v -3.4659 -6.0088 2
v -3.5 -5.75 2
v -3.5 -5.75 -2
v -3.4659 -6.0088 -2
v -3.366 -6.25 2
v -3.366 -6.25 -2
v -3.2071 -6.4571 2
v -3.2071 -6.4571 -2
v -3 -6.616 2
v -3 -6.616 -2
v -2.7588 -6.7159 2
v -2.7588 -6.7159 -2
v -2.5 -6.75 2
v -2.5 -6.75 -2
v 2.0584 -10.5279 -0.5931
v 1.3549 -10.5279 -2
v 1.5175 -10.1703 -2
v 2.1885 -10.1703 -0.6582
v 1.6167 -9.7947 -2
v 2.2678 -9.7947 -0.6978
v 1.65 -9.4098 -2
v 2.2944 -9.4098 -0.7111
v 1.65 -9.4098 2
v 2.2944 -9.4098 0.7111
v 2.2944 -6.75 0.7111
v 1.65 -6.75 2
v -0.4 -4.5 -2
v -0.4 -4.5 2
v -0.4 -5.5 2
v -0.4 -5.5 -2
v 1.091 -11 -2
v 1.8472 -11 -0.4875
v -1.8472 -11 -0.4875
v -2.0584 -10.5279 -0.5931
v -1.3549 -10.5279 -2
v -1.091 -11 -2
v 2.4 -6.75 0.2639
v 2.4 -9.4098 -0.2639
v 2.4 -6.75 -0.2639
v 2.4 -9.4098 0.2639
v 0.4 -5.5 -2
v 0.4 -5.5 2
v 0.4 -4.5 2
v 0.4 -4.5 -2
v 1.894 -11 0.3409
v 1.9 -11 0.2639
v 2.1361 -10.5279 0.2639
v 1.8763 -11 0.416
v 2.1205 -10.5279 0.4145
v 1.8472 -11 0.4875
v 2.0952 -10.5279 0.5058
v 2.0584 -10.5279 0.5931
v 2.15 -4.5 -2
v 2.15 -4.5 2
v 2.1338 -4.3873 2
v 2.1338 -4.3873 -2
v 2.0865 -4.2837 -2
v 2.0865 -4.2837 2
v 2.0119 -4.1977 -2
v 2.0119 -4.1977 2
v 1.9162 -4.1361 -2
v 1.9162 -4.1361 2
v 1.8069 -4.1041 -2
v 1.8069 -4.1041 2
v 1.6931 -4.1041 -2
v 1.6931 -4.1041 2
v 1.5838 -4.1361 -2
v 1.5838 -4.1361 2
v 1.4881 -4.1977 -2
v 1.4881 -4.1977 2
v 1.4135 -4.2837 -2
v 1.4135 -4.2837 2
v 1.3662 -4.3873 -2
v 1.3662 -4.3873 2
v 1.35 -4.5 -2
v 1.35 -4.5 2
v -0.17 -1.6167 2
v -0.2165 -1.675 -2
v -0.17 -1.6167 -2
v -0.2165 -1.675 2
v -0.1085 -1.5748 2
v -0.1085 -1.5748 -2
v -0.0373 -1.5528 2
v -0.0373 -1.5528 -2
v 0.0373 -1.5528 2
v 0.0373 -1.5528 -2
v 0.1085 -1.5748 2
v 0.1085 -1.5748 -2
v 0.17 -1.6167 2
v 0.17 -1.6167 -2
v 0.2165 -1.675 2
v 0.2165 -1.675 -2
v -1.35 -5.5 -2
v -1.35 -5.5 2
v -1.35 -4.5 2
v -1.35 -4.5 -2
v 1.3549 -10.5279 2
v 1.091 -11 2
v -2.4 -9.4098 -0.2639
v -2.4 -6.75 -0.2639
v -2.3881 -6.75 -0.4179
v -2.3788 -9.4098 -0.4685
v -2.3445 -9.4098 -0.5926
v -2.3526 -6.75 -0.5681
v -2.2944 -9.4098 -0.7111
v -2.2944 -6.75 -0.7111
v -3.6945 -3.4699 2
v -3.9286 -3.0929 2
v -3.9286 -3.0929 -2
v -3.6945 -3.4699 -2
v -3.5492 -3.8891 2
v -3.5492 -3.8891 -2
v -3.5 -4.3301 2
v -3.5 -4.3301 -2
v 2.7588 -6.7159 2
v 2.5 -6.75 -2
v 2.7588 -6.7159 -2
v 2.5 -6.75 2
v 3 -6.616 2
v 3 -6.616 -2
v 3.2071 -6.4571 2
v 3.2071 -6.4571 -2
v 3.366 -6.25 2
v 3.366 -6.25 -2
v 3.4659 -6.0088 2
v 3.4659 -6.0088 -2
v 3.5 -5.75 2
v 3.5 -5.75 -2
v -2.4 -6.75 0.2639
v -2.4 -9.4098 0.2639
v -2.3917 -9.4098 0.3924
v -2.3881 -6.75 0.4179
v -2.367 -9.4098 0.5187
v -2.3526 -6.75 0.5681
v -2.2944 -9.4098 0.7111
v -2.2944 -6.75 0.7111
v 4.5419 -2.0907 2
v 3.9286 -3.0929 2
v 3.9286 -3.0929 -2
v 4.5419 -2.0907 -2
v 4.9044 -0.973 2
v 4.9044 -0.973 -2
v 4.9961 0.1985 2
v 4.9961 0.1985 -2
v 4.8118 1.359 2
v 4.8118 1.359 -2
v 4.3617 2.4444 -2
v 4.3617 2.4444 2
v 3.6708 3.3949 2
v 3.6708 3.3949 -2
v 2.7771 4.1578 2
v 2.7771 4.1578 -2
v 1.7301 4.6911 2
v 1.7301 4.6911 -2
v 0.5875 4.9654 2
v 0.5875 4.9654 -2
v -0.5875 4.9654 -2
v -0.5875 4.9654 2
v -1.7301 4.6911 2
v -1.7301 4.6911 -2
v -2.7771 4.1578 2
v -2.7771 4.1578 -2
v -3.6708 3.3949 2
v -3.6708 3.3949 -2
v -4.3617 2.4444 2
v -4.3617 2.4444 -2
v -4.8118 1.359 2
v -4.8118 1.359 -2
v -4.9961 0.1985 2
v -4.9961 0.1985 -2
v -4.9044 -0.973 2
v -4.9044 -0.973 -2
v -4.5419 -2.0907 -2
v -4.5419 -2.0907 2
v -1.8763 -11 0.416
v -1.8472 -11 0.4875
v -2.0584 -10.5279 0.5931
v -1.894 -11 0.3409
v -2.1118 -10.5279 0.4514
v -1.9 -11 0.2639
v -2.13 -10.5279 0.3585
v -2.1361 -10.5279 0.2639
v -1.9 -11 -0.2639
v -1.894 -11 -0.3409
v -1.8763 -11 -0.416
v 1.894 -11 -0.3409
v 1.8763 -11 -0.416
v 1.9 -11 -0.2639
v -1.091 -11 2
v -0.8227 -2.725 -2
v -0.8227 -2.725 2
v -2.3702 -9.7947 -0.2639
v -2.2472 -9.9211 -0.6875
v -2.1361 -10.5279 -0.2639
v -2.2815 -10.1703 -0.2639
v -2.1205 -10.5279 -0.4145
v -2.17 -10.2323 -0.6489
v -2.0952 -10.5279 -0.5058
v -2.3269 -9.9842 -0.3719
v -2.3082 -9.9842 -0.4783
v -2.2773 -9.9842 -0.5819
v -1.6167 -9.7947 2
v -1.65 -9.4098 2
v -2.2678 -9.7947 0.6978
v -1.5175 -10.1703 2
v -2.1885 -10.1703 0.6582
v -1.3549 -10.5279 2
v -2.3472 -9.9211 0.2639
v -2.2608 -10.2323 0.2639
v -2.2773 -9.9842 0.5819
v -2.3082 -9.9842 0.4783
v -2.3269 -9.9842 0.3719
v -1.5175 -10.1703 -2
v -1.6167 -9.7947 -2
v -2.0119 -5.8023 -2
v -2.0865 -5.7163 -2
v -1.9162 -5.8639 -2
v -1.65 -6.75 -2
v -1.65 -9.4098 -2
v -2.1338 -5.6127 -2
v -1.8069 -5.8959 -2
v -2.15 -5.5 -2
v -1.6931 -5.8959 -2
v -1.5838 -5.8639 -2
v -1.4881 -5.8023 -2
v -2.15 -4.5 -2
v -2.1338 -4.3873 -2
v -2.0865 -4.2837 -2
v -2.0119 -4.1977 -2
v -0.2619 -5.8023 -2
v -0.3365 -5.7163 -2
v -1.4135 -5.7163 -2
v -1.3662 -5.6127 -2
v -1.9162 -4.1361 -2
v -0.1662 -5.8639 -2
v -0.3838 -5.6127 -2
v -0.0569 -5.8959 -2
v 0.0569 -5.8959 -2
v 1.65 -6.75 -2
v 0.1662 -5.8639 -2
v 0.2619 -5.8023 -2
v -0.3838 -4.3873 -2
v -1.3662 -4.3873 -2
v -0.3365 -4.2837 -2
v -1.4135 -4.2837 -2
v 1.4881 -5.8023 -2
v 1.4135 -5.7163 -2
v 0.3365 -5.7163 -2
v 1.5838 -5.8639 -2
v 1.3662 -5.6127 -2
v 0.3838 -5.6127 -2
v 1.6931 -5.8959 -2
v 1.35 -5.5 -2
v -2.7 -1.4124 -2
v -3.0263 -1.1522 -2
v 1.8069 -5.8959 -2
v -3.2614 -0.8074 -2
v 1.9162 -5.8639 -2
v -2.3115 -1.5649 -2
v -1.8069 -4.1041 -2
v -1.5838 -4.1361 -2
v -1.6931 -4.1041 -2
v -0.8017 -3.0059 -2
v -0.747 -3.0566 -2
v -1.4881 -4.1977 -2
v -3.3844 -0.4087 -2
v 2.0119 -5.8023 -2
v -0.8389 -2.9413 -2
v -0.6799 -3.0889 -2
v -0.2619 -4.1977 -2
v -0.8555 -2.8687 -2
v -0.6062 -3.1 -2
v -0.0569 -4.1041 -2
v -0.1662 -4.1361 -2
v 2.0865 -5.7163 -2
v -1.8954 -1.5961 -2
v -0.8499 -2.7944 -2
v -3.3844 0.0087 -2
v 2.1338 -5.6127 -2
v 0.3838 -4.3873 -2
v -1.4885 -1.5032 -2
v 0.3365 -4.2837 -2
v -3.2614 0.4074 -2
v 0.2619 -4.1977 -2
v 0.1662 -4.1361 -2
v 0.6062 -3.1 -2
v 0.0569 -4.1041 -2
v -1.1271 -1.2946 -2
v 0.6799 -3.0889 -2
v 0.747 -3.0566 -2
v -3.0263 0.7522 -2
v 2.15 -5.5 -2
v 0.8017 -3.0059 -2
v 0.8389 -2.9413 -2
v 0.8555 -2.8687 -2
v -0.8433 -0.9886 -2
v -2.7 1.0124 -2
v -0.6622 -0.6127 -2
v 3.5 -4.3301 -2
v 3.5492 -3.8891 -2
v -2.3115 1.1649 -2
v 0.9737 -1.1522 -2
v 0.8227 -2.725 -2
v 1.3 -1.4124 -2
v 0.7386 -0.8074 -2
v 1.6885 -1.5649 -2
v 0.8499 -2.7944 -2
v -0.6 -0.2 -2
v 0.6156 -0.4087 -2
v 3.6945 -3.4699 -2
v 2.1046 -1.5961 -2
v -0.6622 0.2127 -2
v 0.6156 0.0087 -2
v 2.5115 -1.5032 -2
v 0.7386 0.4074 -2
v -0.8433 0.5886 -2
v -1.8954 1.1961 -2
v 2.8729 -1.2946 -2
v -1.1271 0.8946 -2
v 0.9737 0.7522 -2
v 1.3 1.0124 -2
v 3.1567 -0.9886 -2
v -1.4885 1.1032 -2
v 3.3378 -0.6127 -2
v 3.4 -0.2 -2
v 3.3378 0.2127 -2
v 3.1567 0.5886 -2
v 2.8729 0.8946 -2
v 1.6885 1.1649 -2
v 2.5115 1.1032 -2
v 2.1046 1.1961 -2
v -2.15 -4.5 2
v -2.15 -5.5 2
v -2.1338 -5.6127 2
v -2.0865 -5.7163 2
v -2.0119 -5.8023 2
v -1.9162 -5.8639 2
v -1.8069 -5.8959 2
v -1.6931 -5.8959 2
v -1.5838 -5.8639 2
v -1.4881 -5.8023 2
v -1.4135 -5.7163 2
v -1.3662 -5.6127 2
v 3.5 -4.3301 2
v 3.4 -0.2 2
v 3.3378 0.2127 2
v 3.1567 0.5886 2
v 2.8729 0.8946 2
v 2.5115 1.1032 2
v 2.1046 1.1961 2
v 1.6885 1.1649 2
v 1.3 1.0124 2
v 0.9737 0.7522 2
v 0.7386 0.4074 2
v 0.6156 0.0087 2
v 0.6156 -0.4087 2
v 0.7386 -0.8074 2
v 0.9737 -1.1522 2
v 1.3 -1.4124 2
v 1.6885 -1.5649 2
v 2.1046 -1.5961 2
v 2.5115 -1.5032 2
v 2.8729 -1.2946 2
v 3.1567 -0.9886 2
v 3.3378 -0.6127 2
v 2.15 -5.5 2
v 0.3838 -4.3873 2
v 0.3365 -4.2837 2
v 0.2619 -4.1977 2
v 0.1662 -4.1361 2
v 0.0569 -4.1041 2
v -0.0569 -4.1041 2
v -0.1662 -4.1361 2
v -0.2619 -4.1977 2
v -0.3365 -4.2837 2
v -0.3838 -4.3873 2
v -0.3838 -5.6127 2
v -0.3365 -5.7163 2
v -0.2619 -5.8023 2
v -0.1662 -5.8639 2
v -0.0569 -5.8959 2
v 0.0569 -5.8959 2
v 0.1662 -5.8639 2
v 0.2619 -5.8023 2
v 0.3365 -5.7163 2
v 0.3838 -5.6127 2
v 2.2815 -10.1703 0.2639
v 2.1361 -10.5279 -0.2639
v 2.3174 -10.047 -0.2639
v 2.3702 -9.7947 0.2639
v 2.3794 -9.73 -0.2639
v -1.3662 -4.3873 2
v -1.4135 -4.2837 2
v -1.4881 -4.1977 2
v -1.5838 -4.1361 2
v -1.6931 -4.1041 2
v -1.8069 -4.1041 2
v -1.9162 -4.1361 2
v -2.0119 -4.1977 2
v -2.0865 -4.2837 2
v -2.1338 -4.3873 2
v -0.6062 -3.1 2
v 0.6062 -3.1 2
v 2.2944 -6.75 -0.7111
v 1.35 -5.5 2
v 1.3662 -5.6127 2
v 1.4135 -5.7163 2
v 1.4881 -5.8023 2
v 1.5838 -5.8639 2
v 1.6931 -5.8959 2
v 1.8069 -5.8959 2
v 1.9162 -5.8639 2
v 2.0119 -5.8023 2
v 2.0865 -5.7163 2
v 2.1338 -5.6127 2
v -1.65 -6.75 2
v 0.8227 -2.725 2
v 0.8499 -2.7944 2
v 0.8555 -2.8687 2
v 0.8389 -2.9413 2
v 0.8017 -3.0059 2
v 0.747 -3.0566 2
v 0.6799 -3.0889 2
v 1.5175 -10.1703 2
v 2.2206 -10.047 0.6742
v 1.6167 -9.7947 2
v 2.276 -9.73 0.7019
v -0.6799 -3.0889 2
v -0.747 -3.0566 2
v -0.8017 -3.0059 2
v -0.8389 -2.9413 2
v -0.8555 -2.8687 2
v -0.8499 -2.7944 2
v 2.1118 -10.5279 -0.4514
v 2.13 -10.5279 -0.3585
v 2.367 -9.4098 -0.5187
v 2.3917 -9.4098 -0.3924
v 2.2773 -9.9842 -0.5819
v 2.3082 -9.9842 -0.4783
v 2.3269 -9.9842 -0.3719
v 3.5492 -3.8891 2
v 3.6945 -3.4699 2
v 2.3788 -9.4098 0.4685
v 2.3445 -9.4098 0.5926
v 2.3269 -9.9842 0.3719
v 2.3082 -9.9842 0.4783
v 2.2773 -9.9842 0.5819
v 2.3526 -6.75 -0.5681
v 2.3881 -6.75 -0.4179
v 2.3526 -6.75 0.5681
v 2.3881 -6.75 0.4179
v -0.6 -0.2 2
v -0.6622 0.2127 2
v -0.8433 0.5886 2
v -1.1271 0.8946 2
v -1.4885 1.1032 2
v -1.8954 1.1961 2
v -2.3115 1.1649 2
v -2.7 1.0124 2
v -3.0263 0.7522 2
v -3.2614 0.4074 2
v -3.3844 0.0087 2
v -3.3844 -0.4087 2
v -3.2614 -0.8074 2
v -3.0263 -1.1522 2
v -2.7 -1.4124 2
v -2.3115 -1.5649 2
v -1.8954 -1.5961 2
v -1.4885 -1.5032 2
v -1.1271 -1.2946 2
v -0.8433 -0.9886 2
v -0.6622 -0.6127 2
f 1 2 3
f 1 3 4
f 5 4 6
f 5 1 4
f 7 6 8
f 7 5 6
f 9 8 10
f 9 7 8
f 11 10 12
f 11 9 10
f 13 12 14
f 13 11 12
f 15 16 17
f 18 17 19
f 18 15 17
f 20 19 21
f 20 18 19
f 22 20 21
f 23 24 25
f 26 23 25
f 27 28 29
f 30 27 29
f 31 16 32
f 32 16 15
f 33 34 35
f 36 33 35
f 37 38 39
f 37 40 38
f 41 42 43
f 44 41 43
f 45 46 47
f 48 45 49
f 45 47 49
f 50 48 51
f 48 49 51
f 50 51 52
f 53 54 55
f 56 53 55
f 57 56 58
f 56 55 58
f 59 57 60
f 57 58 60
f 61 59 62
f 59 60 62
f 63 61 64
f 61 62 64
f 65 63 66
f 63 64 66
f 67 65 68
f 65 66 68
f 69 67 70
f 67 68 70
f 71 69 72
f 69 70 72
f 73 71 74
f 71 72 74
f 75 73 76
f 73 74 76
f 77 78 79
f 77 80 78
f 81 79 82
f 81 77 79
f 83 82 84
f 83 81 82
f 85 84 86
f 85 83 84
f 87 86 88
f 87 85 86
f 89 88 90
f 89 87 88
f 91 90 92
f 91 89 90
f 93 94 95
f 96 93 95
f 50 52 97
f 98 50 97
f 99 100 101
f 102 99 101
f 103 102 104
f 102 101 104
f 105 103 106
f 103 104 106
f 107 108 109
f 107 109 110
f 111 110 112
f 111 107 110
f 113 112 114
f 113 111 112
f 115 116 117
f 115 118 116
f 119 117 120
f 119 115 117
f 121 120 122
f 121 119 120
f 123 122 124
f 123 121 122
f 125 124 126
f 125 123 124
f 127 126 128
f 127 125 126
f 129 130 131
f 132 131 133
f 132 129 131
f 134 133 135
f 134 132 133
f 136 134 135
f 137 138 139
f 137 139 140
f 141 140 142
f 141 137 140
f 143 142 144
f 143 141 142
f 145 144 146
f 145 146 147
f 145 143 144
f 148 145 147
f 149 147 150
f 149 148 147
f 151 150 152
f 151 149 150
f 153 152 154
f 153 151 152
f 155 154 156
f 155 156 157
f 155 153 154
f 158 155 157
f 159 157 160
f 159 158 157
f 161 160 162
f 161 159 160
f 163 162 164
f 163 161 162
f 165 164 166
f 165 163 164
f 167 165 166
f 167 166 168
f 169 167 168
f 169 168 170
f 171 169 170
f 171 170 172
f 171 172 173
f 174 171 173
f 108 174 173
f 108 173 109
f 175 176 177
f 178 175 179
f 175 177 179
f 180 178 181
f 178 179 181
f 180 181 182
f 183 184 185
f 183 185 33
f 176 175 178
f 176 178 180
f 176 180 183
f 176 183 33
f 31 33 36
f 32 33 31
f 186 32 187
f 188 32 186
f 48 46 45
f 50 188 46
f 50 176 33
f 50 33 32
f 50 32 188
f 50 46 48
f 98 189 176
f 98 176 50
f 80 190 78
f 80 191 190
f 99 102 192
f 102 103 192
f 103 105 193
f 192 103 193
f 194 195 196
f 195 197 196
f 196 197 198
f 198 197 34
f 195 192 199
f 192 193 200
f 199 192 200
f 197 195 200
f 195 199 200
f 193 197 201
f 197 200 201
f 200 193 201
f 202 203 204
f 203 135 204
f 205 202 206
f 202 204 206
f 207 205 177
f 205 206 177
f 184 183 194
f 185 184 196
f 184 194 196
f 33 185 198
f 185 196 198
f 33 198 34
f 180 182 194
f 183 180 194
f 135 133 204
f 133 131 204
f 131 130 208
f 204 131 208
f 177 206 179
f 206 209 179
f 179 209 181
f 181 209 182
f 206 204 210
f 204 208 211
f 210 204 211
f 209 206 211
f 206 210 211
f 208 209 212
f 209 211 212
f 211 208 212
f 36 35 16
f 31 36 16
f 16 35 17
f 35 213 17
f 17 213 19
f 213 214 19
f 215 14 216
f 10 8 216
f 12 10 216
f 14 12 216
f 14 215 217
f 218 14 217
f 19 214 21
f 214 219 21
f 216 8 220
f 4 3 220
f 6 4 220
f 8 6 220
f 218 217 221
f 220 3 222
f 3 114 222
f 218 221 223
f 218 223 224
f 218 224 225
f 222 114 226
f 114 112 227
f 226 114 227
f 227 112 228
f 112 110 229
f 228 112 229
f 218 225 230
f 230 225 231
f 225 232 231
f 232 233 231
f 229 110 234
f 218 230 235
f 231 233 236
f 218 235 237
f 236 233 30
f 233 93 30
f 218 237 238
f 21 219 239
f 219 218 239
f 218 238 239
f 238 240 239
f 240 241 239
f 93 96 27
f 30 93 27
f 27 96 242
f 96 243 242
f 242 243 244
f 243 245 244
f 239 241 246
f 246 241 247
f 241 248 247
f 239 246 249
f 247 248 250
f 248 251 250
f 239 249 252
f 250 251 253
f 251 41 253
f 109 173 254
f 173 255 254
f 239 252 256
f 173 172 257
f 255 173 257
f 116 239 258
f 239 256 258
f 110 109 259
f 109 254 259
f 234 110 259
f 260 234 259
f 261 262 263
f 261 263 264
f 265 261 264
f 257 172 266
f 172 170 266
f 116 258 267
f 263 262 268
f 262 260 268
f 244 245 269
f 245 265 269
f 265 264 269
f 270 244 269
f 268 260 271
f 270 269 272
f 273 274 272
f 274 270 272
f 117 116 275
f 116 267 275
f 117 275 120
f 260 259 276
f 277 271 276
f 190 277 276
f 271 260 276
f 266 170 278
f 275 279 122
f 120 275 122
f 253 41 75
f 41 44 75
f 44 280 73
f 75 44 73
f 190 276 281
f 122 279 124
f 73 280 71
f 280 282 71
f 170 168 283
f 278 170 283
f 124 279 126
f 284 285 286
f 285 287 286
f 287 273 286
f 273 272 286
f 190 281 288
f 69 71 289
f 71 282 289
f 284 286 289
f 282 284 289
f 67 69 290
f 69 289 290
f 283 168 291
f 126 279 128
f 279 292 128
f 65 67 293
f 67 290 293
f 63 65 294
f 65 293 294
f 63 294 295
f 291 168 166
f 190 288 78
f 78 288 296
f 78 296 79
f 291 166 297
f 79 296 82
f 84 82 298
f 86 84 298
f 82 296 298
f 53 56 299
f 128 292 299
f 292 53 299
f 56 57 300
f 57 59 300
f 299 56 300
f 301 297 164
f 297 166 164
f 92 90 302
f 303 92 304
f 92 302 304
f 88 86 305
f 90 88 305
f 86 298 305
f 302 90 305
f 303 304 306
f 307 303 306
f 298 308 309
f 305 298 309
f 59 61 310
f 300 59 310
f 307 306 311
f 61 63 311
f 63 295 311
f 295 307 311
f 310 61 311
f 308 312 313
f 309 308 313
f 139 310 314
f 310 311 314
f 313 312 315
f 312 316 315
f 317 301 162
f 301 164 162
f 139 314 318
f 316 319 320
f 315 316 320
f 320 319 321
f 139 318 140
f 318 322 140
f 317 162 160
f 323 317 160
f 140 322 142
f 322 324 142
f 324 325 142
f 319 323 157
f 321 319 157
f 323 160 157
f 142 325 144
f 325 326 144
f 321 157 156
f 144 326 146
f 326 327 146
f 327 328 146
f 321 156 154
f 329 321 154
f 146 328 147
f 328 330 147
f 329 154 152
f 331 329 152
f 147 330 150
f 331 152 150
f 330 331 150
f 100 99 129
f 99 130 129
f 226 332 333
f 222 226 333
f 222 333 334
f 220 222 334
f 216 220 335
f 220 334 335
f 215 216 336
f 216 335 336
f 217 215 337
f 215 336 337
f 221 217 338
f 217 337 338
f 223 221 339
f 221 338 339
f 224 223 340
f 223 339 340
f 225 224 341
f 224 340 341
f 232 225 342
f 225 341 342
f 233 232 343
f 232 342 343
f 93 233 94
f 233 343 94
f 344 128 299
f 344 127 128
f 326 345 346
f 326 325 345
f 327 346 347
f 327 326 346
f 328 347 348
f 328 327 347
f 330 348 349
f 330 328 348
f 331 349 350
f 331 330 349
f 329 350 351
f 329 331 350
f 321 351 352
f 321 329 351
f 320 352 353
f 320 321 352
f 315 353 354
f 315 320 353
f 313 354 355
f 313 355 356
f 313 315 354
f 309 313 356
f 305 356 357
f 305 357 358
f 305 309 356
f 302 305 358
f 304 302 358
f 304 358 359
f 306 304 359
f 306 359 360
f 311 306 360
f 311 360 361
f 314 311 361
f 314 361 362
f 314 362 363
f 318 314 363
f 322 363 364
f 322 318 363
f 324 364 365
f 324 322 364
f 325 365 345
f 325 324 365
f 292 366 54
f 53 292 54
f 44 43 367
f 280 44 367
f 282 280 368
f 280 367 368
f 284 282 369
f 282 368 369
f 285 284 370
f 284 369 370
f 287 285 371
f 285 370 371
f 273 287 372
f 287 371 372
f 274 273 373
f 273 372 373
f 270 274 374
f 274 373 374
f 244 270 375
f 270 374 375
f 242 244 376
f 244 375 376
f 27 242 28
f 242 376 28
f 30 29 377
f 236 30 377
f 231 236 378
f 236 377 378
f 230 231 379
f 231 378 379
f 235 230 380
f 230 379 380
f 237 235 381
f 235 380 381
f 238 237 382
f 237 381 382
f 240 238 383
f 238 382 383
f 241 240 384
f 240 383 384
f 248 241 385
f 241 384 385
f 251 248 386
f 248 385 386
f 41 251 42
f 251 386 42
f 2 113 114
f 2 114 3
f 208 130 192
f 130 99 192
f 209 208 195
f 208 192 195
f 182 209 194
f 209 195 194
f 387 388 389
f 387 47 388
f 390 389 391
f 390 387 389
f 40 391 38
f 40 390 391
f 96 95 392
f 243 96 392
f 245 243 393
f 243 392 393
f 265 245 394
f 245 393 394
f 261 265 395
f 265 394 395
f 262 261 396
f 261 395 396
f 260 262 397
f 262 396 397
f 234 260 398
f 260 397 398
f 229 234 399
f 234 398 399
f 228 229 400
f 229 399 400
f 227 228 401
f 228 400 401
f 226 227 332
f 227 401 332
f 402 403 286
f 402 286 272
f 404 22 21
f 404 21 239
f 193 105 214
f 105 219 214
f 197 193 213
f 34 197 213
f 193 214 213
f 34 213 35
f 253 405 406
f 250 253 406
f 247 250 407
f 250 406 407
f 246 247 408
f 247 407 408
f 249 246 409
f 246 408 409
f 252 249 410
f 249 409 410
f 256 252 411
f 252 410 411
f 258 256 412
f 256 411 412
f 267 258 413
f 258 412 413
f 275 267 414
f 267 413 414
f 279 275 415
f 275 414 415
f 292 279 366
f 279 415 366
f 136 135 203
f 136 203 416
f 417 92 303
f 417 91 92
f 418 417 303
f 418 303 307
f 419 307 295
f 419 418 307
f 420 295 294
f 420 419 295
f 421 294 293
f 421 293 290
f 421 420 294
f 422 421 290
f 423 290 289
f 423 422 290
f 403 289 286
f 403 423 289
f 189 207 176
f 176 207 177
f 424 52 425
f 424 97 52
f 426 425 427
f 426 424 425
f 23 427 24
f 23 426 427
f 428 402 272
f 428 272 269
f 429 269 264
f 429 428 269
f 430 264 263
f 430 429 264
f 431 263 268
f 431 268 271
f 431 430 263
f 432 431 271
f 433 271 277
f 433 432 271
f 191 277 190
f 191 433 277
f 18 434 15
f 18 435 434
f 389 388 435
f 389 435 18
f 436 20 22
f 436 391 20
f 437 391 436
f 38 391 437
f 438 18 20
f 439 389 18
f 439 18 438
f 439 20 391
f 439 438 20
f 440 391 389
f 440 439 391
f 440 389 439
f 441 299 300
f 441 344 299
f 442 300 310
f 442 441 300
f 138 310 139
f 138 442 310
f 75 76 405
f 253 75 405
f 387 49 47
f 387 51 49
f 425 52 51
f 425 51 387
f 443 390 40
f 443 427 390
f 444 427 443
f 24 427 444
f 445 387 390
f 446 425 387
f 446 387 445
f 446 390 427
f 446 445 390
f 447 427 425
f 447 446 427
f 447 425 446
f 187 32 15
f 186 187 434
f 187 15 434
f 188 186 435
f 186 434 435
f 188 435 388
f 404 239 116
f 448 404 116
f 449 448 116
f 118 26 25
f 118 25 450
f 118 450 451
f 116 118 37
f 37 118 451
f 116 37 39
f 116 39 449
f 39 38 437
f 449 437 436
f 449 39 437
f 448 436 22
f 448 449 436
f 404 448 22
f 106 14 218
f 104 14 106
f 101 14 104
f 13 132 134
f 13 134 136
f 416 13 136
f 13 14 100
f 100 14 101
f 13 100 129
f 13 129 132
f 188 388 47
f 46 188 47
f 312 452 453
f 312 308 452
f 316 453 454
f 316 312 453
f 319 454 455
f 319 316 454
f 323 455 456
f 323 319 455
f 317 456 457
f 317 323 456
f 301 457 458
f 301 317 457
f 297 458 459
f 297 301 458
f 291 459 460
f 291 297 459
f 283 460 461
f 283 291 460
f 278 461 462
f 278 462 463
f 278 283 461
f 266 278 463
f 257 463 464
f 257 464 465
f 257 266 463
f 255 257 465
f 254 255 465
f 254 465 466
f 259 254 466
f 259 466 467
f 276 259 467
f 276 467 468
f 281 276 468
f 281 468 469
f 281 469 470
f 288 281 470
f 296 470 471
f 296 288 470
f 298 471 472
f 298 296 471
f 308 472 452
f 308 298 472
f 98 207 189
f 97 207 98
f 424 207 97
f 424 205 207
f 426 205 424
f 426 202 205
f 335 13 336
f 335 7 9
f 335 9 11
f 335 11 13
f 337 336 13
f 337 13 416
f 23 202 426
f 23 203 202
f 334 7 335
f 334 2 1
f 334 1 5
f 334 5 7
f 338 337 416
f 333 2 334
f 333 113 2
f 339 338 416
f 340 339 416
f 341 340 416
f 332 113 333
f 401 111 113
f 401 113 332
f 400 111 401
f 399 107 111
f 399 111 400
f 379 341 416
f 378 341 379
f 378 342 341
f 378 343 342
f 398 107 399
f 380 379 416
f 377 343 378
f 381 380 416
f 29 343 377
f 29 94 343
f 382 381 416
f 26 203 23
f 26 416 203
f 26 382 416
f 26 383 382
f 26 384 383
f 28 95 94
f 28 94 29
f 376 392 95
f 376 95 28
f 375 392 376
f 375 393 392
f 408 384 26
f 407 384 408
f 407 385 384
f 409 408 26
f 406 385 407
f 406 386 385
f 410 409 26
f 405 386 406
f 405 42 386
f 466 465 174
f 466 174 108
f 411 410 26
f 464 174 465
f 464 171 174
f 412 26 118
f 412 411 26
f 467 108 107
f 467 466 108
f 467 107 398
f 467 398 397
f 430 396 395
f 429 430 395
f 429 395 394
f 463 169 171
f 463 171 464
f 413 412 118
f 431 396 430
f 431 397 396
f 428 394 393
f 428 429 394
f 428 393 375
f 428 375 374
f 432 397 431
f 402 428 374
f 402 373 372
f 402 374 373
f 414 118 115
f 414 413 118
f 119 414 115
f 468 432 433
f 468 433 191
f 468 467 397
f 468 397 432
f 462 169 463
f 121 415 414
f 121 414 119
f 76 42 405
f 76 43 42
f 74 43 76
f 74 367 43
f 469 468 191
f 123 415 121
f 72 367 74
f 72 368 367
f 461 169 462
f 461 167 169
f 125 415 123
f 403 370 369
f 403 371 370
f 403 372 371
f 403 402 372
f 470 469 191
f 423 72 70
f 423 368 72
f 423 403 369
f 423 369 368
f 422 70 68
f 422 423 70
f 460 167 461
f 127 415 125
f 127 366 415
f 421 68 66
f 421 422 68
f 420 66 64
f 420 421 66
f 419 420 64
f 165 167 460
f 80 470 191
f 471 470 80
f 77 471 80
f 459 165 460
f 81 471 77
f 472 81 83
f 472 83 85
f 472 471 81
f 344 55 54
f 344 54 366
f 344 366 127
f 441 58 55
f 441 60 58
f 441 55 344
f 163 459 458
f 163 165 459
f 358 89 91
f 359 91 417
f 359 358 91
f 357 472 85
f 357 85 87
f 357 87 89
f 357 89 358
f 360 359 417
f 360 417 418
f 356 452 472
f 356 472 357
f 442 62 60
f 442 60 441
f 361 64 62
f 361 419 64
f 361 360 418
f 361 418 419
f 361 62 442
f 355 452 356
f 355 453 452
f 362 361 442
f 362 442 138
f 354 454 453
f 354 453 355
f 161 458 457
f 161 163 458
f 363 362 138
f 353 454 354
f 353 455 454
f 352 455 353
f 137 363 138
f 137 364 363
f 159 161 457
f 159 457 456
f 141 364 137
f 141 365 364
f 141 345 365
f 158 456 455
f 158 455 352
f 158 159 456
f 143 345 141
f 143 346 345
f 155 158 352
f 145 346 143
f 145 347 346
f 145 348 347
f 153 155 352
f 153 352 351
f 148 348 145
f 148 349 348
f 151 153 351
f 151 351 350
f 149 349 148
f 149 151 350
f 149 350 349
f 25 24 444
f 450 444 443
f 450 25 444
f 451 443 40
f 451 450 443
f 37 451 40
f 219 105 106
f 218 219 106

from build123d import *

# Parameters (mm, degrees)
F0_R       = 1.4
F1_DEPTH   = 2
F2_W       = 4.8
F2_H       = 6
F3_DEPTH   = 2
F4_SIZE2   = 1.5
F4_SIZE    = 0.75
F4_2_SIZE2 = 1.5
F4_2_SIZE  = 0.75
F5_R       = 1
F7_DEPTH   = 4.001
F8_SIZE2   = 1
F8_SIZE    = 0.5
F9_R       = 2.5


with BuildPart() as f1:
    # F0 (on Top) → F1 (new body, symmetric)
    with BuildSketch(Plane.XY):
        with BuildLine():
            ThreePointArc((3.5, -4.3301270189), (3.610177635, -3.6754733482), (3.9285714286, -3.0929478707))
            ThreePointArc((3.9285714286, -3.0929478707), (0, 5), (-3.9285714286, -3.0929478707))
            ThreePointArc((-3.9285714286, -3.0929478707), (-3.610177635, -3.6754733482), (-3.5, -4.3301270189))
            Line((-3.5, -4.3301270189), (-3.5, -5.75))
            ThreePointArc((-3.5, -5.75), (-3.2071067812, -6.4571067812), (-2.5, -6.75))
            Line((-2.5, -6.75), (2.5, -6.75))
            ThreePointArc((2.5, -6.75), (3.2071067812, -6.4571067812), (3.5, -5.75))
            Line((3.5, -5.75), (3.5, -4.3301270189))
        make_face()
        with BuildLine():
            ThreePointArc((0.8227241336, -2.725), (0.8227241336, -2.975), (0.6062177826, -3.1))
            Line((0.6062177826, -3.1), (-0.6062177826, -3.1))
            ThreePointArc((-0.6062177826, -3.1), (-0.8227241336, -2.975), (-0.8227241336, -2.725))
            Line((-0.8227241336, -2.725), (-0.2165063509, -1.675))
            ThreePointArc((-0.2165063509, -1.675), (0, -1.55), (0.2165063509, -1.675))
            Line((0.2165063509, -1.675), (0.8227241336, -2.725))
        make_face(mode=Mode.SUBTRACT)
        with Locations((-2, -0.2)):
            Circle(F0_R, mode=Mode.SUBTRACT)
        with Locations((2, -0.2)):
            Circle(F0_R, mode=Mode.SUBTRACT)
    extrude(amount=F1_DEPTH, both=True)

    # F2 (on Top) → F3 (join, symmetric)
    with BuildSketch(Plane.XY):
        with Locations((0, -8)):
            Rectangle(F2_W, F2_H)
    extrude(amount=F3_DEPTH, both=True)

    # F4
    f4_edges = [f1.edges().sort_by_distance(p)[0] for p in [
        (2.4, -8.875, 2),
        (-2.4, -8.875, 2),
    ]]
    f4_side = f1.faces().sort_by_distance((3.07369, -6.32369, 2))[0]
    chamfer(f4_edges, length=F4_SIZE, length2=F4_SIZE2, reference=f4_side)

    # F4#2
    f4_2_edges = [f1.edges().sort_by_distance(p)[0] for p in [
        (2.4, -8.875, -2),
        (-2.4, -8.875, -2),
    ]]
    f4_2_side = f1.faces().sort_by_distance((3.07369, -6.32369, -2))[0]
    chamfer(f4_2_edges, length=F4_2_SIZE, length2=F4_2_SIZE2, reference=f4_2_side)

    # F5
    f5_edges = [f1.edges().sort_by_distance(p)[0] for p in [
        (2.4, -8.875, 0.5),
        (2.4, -8.875, -0.5),
        (-2.4, -8.875, 0.5),
        (-2.4, -8.875, -0.5),
    ]]
    fillet(f5_edges, radius=F5_R)

    # F6 (on face) → F7 (cut, through all)
    with BuildSketch(Plane.XY.offset(2)):
        with BuildLine():
            ThreePointArc((-2.15, -5.5), (-1.75, -5.9), (-1.35, -5.5))
            Line((-1.35, -5.5), (-1.35, -4.5))
            ThreePointArc((-1.35, -4.5), (-1.75, -4.1), (-2.15, -4.5))
            Line((-2.15, -4.5), (-2.15, -5.5))
        make_face()
        with BuildLine():
            ThreePointArc((0.4, -4.5), (0, -4.1), (-0.4, -4.5))
            Line((-0.4, -4.5), (-0.4, -5.5))
            ThreePointArc((-0.4, -5.5), (0, -5.9), (0.4, -5.5))
            Line((0.4, -5.5), (0.4, -4.5))
        make_face()
        with BuildLine():
            ThreePointArc((2.15, -4.5), (1.75, -4.1), (1.35, -4.5))
            Line((1.35, -4.5), (1.35, -5.5))
            ThreePointArc((1.35, -5.5), (1.75, -5.9), (2.15, -5.5))
            Line((2.15, -5.5), (2.15, -4.5))
        make_face()
    extrude(amount=-F7_DEPTH, mode=Mode.SUBTRACT)

    # F8
    f8_edges = [f1.edges().sort_by_distance(p)[0] for p in [
        (1.972214, -11, -1.355573),
        (2.373249, -11, -0.493685),
        (2.4, -11, 0),
        (2.373249, -11, 0.493685),
        (1.972214, -11, 1.355573),
        (-1.972214, -11, 1.355573),
    ]]
    chamfer(f8_edges, length=F8_SIZE, length2=F8_SIZE2)

    # F9
    f9_edges = [f1.edges().sort_by_distance(p)[0] for p in [
        (1.972214, -10, 1.355573),
        (-1.972214, -10, 1.355573),
    ]]
    fillet(f9_edges, radius=F9_R)


solid = f1.part
